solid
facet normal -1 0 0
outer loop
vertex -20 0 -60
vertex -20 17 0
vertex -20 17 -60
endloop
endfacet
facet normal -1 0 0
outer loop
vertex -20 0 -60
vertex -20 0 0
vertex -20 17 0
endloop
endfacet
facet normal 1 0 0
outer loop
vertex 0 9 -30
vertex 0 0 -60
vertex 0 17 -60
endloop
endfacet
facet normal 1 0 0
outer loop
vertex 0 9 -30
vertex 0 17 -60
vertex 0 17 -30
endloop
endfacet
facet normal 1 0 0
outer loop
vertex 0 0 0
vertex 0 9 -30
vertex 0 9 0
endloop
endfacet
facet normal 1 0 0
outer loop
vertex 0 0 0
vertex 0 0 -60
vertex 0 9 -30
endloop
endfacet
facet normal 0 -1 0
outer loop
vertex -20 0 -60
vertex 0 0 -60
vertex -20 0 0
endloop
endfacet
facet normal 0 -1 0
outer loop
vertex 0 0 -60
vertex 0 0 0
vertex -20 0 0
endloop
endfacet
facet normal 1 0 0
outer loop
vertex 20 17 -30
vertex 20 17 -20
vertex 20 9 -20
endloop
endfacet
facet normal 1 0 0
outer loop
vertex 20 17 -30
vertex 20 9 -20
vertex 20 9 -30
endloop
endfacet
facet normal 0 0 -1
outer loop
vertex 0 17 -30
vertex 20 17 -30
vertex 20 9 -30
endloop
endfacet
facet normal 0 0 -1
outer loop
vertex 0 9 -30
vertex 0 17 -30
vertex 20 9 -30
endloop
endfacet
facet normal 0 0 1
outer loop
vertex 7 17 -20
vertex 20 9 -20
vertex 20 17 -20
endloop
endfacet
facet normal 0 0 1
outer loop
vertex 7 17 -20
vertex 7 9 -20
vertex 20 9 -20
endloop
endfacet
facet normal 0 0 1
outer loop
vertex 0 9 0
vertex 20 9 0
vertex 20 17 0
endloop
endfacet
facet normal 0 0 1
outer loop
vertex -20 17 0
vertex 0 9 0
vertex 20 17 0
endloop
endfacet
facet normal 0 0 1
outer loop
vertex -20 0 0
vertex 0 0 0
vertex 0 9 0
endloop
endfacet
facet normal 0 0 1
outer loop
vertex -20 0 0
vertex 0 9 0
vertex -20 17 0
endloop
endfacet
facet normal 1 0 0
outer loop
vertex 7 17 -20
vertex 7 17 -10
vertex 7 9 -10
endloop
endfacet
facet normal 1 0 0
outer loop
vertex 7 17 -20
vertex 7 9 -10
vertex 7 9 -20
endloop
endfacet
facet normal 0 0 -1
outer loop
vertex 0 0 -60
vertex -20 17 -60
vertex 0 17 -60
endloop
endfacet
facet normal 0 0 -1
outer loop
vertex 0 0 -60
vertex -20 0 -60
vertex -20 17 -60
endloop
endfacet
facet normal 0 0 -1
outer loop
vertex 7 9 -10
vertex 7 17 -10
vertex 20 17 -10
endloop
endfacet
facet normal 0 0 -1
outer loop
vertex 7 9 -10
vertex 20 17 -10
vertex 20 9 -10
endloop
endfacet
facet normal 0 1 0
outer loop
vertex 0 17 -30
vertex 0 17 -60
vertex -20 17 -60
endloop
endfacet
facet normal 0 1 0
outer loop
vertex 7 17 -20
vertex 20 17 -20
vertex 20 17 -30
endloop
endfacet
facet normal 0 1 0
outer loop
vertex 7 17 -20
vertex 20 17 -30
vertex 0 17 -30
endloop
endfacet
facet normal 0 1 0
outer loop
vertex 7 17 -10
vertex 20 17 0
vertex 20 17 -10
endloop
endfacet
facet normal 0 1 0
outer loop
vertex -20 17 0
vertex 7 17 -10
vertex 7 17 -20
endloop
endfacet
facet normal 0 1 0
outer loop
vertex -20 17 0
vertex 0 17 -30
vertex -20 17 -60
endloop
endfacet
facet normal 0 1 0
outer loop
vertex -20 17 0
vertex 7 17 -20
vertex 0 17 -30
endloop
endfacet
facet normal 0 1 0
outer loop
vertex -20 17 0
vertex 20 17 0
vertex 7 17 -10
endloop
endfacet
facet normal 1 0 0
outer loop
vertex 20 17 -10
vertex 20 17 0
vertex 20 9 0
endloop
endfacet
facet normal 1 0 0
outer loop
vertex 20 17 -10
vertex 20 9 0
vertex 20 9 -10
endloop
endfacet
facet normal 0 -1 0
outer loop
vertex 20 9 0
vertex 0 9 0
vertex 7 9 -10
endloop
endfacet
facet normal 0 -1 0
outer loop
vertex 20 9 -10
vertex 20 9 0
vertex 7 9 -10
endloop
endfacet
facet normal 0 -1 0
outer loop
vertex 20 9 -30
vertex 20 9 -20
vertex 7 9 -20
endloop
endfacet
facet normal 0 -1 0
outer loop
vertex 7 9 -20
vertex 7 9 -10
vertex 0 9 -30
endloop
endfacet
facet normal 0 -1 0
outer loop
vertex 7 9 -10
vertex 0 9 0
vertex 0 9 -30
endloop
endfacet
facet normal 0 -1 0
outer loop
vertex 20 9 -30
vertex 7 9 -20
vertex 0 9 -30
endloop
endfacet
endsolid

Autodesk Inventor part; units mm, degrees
ref_plane "YZ Plane" through (0, 0, 0) normal (1, 0, 0) x (0, 1, 0)
ref_plane "XZ Plane" through (0, 0, 0) normal (0, 1, 0) x (-1, 0, 0)
ref_plane "XY Plane" through (0, 0, 0) normal (0, 0, 1) x (1, 0, 0)
sketch "Sketch1" plane through (0, 0, 0) normal (0, 1, 0) x (-1, 0, 0)
  line L0 (0, 0) -> (20, 0)
  line L1 (20, 0) -> (20, -60)
  line L2 (20, -60) -> (0, -60)
  line L3 (0, -60) -> (0, 0)
  dimension "d0" = 20
  dimension "d1" = 60
extrude "Extrusion1" add sketch "Sketch1" along normal blind 17
sketch "Sketch2" plane through (0, 0, 0) normal (1, 0, 0) x (0, 0, -1)
  line L0 (60, 17) -> (0, 17) projected
  line L1 (0, 17) -> (10, 17)
  line L2 (10, 17) -> (10, 9)
  line L3 (10, 9) -> (0, 9)
  line L4 (0, 9) -> (0, 17)
  line L5 (10, 17) -> (20, 17)
  line L6 (20, 17) -> (30, 17)
  line L7 (30, 17) -> (30, 9)
  line L8 (30, 9) -> (20, 9)
  line L9 (20, 9) -> (20, 17)
  line L10 (10, 9) -> (20, 9)
  point P0 (0, 0)
  dimension "d4" = 10
  dimension "d5" = 8
  dimension "d6" = 10
  dimension "d7" = 10
  dimension "d8" = 8
extrude "Extrusion2" add sketch "Sketch2" along normal blind 20 contours L7 L8 L9 L0 | L2 L3 L4 L0
sketch "Sketch3" plane through (0, 17, 0) normal (0, 1, 0) x (1, 0, 0)
  point P0 (0, 0)
extrude "Extrusion3" add sketch "Sketch2" along normal blind 7 contours L9 L10 L2 L0
properties part number "millenium"
